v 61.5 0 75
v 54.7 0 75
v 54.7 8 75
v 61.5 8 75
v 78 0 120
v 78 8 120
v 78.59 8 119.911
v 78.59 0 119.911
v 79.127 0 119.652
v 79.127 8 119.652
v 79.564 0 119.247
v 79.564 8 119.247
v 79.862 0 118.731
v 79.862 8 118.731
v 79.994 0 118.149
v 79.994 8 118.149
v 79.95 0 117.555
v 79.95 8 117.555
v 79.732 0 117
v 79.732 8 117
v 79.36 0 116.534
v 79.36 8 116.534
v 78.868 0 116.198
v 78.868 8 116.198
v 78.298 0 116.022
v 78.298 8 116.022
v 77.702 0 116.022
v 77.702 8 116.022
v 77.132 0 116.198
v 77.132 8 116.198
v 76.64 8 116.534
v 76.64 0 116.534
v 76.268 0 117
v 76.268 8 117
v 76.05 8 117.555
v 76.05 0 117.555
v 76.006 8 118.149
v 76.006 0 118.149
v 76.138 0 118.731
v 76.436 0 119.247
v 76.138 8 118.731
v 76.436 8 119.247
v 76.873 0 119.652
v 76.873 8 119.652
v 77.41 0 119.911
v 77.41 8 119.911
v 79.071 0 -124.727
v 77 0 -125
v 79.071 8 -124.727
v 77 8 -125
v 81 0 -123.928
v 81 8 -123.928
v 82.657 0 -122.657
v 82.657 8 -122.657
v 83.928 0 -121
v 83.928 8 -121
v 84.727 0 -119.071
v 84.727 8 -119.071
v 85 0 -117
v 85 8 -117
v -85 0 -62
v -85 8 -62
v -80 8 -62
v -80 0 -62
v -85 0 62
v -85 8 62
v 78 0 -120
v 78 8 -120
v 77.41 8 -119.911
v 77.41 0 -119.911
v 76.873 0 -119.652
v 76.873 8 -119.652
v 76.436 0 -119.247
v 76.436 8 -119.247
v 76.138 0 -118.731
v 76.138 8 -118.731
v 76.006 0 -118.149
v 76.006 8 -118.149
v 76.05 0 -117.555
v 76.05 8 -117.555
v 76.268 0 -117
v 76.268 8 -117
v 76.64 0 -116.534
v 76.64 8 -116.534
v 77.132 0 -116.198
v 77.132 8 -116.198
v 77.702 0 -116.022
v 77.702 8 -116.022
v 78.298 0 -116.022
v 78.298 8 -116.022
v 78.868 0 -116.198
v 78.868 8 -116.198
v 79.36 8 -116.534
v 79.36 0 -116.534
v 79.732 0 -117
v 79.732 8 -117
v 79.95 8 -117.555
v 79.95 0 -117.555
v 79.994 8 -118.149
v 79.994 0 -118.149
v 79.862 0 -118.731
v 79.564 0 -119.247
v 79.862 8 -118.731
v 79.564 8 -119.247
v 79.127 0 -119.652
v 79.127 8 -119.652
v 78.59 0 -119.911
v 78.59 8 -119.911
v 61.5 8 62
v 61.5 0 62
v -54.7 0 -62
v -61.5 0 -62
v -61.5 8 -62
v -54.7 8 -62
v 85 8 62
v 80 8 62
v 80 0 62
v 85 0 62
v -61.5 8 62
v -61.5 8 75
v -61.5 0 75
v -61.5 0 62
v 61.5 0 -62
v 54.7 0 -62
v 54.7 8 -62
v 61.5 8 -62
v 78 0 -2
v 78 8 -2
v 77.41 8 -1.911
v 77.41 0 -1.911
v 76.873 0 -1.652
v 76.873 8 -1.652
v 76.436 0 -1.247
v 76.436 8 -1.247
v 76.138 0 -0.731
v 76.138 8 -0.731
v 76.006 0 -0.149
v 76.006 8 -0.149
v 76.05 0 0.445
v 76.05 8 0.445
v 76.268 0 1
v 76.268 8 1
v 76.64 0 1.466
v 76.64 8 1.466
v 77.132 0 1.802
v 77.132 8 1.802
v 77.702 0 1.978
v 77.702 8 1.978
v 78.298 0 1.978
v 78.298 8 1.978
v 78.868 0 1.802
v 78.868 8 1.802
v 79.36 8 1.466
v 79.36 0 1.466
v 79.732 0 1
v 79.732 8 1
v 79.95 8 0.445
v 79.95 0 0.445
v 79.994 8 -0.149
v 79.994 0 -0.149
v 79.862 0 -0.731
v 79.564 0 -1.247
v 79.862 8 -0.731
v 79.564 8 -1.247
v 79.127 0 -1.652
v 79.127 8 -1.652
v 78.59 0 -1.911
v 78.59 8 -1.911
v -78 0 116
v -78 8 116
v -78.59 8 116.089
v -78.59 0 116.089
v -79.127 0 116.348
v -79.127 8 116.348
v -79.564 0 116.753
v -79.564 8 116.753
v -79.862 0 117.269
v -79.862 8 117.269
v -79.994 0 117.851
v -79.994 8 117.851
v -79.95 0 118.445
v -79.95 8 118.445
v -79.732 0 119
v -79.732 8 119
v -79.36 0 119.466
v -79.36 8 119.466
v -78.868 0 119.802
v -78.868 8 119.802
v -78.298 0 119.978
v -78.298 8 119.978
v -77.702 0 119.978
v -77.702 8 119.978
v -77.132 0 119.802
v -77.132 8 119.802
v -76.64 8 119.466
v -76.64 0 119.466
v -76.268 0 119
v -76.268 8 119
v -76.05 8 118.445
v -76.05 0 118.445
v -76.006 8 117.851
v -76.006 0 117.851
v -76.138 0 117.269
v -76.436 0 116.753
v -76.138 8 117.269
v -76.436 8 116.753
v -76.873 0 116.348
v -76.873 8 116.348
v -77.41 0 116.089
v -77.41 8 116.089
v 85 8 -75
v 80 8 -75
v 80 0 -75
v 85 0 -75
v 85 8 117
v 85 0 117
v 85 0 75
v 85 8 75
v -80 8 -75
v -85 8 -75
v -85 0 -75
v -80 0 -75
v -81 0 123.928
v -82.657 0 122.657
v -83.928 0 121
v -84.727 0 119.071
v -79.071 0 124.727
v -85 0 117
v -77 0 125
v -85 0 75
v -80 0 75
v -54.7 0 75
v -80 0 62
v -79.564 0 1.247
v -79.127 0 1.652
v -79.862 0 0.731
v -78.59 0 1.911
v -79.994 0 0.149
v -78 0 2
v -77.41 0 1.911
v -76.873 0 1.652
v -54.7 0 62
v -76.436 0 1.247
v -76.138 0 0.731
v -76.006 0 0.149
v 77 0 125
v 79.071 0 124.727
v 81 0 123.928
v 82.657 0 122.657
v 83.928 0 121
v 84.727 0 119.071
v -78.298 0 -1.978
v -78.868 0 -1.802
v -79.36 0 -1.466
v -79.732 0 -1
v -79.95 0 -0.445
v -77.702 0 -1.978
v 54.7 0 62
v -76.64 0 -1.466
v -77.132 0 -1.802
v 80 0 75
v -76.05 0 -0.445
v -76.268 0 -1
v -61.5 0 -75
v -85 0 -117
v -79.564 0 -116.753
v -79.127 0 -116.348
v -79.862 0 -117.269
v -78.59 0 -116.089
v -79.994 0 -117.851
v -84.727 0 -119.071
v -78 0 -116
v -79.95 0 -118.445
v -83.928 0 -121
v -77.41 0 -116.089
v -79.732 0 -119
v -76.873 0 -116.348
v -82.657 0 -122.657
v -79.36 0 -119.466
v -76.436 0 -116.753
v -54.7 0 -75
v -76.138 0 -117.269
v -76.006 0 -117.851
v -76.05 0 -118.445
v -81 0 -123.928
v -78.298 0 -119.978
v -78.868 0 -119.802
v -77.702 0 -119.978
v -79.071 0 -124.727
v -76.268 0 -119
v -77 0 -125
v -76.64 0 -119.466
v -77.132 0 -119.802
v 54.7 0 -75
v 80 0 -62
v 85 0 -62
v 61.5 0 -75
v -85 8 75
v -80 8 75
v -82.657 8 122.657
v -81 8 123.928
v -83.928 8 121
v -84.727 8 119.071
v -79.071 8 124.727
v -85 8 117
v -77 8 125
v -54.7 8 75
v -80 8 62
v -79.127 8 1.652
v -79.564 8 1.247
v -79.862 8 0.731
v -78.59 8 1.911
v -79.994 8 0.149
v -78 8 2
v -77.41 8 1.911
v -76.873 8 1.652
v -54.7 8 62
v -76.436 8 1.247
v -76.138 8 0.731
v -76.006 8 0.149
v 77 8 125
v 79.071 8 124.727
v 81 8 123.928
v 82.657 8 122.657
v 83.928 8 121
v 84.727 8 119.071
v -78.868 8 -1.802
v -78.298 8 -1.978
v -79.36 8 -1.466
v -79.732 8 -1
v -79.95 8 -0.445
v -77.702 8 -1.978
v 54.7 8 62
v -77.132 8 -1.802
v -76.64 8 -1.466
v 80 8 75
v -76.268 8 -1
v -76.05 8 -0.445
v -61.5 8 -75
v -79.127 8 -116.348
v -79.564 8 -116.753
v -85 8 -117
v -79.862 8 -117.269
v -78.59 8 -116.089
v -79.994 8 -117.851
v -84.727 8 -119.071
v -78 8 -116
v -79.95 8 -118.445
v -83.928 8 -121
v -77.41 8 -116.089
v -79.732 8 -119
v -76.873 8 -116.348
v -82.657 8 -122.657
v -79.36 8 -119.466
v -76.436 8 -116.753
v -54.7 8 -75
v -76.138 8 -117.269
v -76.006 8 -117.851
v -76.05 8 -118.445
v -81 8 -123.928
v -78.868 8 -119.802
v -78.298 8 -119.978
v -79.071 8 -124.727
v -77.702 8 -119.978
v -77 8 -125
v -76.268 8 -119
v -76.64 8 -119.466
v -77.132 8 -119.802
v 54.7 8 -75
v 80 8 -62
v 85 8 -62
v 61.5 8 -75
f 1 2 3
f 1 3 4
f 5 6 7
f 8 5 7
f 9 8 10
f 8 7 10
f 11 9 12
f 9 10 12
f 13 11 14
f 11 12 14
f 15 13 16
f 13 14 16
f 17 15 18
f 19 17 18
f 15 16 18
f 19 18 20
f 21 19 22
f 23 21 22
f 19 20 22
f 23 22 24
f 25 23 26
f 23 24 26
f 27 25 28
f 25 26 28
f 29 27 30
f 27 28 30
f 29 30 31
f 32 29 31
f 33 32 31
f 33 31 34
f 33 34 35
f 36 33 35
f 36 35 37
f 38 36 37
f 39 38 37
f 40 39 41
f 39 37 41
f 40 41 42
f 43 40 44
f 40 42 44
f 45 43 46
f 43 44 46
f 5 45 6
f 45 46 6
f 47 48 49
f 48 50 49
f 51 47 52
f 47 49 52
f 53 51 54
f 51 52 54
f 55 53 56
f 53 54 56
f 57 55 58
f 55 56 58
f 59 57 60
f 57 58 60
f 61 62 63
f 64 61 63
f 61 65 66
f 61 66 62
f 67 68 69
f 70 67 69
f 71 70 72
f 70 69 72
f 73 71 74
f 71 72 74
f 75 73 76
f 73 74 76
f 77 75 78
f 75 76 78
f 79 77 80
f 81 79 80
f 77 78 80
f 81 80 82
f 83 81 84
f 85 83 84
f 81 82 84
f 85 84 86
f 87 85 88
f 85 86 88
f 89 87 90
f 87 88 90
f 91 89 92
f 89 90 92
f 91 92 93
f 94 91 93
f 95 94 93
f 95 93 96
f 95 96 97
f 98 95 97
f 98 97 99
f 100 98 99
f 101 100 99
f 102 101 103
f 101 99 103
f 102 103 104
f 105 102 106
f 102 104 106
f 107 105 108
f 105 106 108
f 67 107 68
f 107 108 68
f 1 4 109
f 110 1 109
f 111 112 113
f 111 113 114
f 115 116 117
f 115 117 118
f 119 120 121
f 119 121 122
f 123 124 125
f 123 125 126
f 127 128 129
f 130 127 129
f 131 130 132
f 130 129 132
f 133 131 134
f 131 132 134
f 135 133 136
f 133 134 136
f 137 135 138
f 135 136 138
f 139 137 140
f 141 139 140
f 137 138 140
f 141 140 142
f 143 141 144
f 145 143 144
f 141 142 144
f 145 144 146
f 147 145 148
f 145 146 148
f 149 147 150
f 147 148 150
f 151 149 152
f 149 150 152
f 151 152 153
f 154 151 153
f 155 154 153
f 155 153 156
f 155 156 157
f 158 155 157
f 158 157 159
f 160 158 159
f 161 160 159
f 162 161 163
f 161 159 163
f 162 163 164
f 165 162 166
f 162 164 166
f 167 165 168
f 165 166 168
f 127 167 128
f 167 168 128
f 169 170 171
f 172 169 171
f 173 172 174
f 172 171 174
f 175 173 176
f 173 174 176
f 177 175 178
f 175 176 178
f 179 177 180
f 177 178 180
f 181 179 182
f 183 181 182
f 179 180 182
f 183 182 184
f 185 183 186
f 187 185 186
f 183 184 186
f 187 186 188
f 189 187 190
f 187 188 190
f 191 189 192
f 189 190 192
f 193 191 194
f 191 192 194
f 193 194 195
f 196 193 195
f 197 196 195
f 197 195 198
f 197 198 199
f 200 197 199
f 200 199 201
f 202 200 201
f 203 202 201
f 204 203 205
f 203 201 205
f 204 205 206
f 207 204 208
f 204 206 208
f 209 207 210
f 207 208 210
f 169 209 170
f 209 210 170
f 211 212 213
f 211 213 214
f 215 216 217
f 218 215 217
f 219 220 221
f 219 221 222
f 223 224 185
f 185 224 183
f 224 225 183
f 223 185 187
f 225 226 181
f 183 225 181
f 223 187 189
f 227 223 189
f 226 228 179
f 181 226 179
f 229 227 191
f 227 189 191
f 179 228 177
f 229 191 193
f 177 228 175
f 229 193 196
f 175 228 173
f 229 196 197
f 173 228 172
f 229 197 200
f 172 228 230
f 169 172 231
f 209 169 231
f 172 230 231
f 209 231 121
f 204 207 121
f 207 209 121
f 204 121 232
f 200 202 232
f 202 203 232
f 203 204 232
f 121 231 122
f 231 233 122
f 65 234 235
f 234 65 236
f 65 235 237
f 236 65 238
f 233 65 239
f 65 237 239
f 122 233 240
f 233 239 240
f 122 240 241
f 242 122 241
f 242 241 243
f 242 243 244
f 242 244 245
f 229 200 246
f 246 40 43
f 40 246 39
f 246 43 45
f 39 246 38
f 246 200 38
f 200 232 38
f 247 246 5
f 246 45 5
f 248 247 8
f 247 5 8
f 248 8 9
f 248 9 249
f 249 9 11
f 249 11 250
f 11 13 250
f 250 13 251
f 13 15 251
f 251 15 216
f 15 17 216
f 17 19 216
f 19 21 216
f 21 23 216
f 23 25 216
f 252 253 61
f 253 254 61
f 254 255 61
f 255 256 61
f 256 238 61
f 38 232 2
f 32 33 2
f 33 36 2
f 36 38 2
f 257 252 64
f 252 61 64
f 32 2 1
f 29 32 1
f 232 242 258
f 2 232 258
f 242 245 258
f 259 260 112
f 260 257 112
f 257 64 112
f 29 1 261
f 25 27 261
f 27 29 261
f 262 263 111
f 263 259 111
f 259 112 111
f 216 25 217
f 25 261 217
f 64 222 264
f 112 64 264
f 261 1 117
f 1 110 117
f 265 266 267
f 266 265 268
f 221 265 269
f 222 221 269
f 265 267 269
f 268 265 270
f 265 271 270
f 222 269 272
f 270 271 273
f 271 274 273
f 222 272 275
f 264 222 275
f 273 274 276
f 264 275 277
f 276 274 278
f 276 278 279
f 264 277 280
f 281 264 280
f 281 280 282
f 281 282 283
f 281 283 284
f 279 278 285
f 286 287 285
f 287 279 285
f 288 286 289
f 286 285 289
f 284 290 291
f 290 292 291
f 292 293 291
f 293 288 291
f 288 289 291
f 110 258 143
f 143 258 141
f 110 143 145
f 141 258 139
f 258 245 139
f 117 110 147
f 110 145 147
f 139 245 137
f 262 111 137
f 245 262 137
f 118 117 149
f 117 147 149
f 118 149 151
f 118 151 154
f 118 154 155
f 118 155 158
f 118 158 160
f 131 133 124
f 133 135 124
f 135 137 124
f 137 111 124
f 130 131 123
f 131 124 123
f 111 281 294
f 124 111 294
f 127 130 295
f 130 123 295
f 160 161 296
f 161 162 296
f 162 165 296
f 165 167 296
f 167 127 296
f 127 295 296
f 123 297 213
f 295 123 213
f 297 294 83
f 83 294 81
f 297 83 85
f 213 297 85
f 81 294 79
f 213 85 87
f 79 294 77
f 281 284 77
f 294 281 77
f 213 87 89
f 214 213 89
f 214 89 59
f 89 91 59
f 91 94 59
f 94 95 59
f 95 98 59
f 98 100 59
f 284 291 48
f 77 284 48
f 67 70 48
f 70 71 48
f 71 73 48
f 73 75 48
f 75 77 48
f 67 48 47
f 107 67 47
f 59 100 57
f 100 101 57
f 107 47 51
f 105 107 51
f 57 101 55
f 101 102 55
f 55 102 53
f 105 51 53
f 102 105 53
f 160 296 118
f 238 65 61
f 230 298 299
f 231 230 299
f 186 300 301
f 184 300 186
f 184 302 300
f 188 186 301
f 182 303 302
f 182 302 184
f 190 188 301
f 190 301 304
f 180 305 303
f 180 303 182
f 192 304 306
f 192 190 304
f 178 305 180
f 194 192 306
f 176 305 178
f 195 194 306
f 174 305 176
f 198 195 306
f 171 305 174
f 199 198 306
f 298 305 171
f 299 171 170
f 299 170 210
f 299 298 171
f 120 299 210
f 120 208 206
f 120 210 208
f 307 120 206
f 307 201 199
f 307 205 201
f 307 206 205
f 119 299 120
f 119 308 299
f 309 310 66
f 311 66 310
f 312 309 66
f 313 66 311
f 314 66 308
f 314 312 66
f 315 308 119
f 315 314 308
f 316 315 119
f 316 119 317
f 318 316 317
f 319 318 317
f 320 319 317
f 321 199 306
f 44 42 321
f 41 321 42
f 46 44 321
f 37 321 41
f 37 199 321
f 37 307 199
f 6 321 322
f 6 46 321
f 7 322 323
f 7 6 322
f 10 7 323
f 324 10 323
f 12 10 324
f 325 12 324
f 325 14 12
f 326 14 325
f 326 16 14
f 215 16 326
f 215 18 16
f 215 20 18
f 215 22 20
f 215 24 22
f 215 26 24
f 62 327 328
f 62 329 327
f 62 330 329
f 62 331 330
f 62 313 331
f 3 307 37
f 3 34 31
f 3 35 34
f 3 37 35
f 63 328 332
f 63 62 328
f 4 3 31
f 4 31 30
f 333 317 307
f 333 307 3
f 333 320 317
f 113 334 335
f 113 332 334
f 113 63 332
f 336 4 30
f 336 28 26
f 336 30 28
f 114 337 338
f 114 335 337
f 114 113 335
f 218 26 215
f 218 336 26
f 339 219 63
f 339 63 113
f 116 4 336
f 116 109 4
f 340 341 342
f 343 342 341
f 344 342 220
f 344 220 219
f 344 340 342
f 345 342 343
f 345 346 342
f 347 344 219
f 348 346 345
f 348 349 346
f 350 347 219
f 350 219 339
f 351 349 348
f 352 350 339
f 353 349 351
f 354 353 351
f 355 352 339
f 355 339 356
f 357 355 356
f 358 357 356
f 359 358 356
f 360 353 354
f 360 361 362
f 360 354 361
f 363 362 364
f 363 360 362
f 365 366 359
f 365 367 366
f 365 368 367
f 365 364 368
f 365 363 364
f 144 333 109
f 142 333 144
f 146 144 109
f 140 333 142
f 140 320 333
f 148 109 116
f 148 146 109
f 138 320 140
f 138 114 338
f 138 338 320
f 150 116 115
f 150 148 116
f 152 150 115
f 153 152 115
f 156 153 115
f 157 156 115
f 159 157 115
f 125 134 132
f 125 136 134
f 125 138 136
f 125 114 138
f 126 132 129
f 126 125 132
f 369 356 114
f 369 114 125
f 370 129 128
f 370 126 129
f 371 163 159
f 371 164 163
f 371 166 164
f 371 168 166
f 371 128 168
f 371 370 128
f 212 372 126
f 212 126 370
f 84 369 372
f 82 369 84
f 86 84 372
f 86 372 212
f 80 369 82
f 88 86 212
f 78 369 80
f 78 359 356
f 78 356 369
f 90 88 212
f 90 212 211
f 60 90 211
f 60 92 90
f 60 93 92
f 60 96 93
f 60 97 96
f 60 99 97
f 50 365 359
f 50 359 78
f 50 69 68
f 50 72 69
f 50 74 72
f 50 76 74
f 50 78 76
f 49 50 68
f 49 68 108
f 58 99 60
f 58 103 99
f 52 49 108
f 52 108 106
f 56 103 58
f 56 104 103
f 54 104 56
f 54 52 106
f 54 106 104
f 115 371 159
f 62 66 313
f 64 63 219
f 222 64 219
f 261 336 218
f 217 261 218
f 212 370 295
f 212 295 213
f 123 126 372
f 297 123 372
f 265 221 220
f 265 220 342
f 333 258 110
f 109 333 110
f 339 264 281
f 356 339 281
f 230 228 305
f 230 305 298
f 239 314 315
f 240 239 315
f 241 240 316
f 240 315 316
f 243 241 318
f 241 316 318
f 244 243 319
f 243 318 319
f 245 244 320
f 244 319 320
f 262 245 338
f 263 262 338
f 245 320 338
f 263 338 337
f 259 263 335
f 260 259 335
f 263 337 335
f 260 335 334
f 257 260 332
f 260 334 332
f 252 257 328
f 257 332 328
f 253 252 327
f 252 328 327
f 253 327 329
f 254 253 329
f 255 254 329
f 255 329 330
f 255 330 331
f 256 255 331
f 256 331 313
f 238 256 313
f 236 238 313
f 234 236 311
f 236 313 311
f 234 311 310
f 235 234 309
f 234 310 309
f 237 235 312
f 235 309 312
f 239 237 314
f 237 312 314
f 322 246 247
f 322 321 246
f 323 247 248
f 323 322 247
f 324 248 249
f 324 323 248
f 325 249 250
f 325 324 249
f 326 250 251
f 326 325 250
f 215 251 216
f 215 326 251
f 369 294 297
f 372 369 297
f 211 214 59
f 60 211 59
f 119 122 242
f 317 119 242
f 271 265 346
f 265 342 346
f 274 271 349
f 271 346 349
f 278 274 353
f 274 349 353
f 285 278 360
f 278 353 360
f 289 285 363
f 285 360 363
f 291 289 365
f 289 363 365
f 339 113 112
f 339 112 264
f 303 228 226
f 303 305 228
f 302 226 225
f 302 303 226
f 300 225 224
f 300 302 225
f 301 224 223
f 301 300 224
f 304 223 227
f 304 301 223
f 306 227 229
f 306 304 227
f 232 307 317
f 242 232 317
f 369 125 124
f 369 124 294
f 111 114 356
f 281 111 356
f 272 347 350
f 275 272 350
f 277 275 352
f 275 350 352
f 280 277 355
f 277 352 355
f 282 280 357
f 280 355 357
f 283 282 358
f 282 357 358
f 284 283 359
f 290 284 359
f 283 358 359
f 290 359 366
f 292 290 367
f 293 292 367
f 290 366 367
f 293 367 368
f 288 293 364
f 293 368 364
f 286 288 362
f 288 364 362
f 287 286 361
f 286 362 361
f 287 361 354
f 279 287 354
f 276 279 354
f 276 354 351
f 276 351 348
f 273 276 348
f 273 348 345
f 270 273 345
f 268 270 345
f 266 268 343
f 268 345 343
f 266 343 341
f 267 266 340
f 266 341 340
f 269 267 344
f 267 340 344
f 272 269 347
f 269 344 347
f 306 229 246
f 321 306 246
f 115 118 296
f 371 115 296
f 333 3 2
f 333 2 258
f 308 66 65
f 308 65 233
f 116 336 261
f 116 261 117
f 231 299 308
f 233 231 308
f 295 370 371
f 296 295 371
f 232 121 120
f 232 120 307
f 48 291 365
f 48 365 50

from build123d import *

# Parameters (mm, degrees)
SKETCH1_W           = 170
SKETCH1_H           = 250
BOSS_EXTRUDE1_DEPTH = 8
SKETCH2_W           = 5
SKETCH2_H           = 13
CUT_EXTRUDE1_DEPTH  = 8
SKETCH3_R           = 2
SKETCH3_W           = 6.8
SKETCH3_H           = 13
CUT_EXTRUDE2_DEPTH  = 8
FILLET1_R           = 8


with BuildPart() as part:
    # Sketch1 → Boss-Extrude1 (new body)
    with BuildSketch(Plane(origin=(0, 0, 0), x_dir=(1, 0, 0), z_dir=(0, 1, 0))):
        Rectangle(SKETCH1_W, SKETCH1_H)
    extrude(amount=BOSS_EXTRUDE1_DEPTH)

    # Sketch2 → Cut-Extrude1 (cut)
    with BuildSketch(Plane(origin=(0, 8, 0), x_dir=(1, 0, 0), z_dir=(0, 1, 0))):
        with Locations((82.5, 68.5)):
            Rectangle(SKETCH2_W, SKETCH2_H)
        with Locations((-82.5, 68.5)):
            Rectangle(SKETCH2_W, SKETCH2_H)
        with Locations((82.5, -68.5)):
            Rectangle(SKETCH2_W, SKETCH2_H)
        with Locations((-82.5, -68.5)):
            Rectangle(SKETCH2_W, SKETCH2_H)
    extrude(amount=-CUT_EXTRUDE1_DEPTH, mode=Mode.SUBTRACT)

    # Sketch3 → Cut-Extrude2 (cut)
    with BuildSketch(Plane(origin=(0, 8, 0), x_dir=(1, 0, 0), z_dir=(0, 1, 0))):
        with Locations(Location((-78, 118, 0), (0, 0, 270))):
            Circle(SKETCH3_R)
        with Locations(Location((78, 118, 0), (0, 0, 90))):
            Circle(SKETCH3_R)
        with Locations(Location((78, -118, 0), (0, 0, 270))):
            Circle(SKETCH3_R)
        with Locations(Location((-78, -118, 0), (0, 0, 90))):
            Circle(SKETCH3_R)
        with Locations(Location((-78, 0, 0), (0, 0, 270))):
            Circle(SKETCH3_R)
        with Locations(Location((78, 0, 0), (0, 0, 90))):
            Circle(SKETCH3_R)
        with Locations((-58.1, 68.5)):
            Rectangle(SKETCH3_W, SKETCH3_H)
        with Locations((58.1, 68.5)):
            Rectangle(SKETCH3_W, SKETCH3_H)
        with Locations((58.1, -68.5)):
            Rectangle(SKETCH3_W, SKETCH3_H)
        with Locations((-58.1, -68.5)):
            Rectangle(SKETCH3_W, SKETCH3_H)
    extrude(amount=-CUT_EXTRUDE2_DEPTH, mode=Mode.SUBTRACT)

    # Fillet1
    fillet1_edges = [part.edges().sort_by_distance(p)[0] for p in [
        (85, 4, 125),
        (-85, 4, 125),
        (-85, 4, -125),
        (85, 4, -125),
    ]]
    fillet(fillet1_edges, radius=FILLET1_R)


solid = part.part
